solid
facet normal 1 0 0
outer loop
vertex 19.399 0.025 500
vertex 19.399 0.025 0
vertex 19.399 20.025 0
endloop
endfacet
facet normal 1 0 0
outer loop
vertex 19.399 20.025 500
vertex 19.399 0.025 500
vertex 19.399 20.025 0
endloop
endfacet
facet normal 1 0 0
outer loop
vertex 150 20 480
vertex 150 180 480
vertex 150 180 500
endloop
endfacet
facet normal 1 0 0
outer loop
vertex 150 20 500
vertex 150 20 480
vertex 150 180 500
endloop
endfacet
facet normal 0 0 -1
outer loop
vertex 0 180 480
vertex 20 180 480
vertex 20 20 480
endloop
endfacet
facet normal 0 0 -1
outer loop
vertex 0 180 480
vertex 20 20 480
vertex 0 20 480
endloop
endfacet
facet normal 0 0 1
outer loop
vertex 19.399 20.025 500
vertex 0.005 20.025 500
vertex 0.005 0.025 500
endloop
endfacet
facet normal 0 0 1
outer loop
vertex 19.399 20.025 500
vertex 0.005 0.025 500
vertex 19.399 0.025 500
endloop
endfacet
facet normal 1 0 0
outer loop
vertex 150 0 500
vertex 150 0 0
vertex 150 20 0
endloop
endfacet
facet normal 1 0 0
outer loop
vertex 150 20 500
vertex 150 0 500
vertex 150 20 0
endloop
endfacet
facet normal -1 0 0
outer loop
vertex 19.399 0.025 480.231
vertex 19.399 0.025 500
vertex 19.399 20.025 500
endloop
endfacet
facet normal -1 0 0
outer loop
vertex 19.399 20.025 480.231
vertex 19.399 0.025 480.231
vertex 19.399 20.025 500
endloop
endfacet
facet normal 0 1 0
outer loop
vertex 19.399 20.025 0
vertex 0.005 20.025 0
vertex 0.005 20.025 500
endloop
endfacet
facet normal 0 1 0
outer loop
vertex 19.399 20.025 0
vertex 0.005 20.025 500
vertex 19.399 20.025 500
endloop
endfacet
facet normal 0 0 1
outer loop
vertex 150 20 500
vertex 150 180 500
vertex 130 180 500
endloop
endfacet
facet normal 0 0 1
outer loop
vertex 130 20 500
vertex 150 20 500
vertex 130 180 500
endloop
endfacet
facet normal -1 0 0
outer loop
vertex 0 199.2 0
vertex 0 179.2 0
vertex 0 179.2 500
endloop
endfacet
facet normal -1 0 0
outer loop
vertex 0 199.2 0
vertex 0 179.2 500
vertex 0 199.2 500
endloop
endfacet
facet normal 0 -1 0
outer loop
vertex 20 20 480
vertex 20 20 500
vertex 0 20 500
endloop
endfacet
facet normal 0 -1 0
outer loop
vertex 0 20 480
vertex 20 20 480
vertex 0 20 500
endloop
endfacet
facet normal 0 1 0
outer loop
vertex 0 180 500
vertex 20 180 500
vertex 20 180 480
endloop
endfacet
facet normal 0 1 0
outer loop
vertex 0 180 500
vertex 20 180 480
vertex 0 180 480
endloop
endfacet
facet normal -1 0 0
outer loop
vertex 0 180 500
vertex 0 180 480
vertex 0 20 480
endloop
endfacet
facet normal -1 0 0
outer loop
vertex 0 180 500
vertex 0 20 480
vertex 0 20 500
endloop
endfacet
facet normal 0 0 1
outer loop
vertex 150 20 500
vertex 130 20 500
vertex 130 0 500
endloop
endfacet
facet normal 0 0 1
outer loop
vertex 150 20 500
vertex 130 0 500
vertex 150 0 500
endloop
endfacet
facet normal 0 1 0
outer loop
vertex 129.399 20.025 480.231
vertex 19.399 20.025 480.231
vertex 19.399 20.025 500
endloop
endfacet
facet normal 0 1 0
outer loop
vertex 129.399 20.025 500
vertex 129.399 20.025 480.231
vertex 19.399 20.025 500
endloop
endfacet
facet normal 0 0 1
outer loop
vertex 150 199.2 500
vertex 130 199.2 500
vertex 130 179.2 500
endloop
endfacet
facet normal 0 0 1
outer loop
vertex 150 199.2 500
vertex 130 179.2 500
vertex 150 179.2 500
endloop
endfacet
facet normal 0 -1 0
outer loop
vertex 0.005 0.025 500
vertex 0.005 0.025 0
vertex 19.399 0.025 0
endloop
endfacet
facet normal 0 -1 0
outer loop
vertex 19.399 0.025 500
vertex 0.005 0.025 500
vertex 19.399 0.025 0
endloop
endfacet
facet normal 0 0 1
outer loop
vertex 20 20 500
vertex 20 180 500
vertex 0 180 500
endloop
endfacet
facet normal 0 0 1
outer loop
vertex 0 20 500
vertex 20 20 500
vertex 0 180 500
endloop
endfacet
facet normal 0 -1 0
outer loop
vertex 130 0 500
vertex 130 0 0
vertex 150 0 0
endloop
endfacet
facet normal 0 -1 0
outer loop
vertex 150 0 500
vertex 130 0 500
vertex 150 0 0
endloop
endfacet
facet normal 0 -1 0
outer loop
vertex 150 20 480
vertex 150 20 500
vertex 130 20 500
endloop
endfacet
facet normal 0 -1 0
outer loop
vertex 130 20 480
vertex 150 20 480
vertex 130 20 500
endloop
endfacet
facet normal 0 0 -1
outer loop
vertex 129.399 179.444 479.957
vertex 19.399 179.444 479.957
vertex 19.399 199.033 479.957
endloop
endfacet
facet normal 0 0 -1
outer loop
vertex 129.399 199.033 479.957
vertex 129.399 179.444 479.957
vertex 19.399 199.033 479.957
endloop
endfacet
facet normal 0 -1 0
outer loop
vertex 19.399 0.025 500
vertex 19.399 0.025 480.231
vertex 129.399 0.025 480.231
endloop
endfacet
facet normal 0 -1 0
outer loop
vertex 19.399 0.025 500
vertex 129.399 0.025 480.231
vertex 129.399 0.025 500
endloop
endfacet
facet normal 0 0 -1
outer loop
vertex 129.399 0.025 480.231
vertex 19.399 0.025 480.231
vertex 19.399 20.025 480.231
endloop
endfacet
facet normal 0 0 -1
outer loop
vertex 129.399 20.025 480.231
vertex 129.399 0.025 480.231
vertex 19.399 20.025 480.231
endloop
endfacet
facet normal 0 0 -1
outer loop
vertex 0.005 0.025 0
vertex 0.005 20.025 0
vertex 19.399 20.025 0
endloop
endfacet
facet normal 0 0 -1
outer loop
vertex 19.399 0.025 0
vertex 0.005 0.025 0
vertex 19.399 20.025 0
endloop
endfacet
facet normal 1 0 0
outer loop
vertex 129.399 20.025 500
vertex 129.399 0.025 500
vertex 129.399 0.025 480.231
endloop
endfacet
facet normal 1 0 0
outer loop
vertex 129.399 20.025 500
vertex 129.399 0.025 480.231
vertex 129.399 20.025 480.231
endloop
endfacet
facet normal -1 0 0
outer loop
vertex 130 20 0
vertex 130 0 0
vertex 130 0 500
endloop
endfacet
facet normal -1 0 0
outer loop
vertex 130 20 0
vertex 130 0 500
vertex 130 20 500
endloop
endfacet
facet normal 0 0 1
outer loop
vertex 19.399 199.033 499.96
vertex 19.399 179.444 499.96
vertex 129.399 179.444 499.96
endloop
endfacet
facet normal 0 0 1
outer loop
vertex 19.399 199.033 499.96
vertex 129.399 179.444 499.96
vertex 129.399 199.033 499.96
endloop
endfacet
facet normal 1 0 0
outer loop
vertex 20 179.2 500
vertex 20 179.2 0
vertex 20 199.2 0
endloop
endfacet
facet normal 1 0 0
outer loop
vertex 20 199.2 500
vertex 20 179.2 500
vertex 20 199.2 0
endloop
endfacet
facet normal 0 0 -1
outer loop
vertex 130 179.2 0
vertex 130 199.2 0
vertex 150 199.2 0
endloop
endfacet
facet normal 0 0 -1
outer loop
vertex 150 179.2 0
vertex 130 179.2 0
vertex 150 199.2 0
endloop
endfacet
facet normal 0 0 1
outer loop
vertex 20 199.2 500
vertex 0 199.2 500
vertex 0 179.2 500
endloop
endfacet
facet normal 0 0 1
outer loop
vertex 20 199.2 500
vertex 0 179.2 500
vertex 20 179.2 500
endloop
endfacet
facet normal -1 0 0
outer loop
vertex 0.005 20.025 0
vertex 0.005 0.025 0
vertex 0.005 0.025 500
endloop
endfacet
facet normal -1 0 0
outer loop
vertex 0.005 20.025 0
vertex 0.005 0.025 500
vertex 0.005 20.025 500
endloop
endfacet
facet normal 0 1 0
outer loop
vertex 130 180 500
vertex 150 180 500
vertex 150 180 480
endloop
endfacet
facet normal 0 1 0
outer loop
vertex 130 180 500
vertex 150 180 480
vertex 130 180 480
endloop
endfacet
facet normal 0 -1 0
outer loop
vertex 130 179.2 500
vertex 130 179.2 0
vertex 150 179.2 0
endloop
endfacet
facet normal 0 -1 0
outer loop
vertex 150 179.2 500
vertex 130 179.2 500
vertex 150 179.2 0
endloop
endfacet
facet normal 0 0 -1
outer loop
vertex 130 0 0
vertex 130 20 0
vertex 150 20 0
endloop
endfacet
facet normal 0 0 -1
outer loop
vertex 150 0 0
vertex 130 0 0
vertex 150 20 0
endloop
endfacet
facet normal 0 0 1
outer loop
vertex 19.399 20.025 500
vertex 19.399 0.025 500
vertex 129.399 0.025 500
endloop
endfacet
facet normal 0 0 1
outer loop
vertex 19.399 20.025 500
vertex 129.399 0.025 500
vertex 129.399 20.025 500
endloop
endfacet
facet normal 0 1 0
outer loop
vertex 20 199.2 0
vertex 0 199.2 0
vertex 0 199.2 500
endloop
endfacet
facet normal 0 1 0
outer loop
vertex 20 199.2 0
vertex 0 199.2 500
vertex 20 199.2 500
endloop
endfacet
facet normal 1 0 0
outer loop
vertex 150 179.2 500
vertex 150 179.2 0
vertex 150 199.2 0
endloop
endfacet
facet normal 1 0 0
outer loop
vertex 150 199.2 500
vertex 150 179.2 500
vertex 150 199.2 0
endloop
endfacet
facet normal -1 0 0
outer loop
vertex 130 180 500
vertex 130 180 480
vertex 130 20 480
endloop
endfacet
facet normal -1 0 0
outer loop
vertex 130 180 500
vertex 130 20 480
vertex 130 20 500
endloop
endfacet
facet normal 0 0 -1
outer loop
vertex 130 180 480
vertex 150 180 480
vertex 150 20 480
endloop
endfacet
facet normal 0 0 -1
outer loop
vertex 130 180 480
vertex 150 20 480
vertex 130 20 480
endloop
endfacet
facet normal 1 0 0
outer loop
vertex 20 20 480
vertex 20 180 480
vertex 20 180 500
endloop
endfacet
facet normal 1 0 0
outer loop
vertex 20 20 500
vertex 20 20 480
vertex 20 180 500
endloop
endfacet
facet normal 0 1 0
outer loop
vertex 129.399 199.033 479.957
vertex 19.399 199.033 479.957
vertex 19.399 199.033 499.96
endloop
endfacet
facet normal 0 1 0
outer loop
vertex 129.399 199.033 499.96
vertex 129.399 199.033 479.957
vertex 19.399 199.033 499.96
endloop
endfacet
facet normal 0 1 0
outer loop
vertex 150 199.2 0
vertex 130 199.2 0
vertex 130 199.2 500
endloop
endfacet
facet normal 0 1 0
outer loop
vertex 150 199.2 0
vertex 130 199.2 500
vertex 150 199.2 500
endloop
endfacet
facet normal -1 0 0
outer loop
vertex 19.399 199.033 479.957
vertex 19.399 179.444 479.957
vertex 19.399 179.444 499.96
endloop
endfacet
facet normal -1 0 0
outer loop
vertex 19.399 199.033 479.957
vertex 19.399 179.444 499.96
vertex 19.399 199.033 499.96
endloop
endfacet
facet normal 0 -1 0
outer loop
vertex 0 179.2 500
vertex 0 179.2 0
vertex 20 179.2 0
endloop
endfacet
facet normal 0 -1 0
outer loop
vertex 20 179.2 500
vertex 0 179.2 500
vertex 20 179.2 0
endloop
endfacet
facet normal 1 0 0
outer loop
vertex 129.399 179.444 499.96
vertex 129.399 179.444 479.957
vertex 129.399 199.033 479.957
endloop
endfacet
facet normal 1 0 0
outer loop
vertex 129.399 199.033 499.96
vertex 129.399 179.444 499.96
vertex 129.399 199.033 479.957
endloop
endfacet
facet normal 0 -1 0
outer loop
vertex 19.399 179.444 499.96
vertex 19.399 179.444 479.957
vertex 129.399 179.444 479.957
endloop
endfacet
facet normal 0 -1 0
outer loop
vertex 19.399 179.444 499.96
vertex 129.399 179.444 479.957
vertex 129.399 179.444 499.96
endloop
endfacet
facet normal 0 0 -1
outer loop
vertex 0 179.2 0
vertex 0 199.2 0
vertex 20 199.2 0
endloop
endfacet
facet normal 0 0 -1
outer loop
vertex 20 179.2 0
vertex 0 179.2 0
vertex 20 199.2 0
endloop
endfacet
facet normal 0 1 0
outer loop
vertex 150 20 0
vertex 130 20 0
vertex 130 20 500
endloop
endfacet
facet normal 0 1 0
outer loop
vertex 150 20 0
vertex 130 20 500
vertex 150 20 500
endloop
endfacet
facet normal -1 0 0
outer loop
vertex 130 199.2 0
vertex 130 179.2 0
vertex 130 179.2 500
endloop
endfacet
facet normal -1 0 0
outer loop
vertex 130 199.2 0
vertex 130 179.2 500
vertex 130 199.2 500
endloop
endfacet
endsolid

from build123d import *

# Parameters (mm, degrees)
F1_W     = 20
F1_H     = 20
F1_W_2   = 19.393947
F2_DEPTH = 500
F3_W     = 20
F3_H     = 20
F4_DEPTH = 160
F5_W     = 20
F5_H     = 19.769341
F5_W_2   = 19.589409
F5_H_2   = 20.003289
F6_DEPTH = 110


with BuildPart() as f2:
    # F1 (on Top) → F2 (new body)
    with BuildSketch(Plane.XY):
        with Locations((10, 189.199662)):
            Rectangle(F1_W, F1_H)
        with Locations((140, 189.199662)):
            Rectangle(F1_W, F1_H)
        with Locations((140, 10)):
            Rectangle(F1_W, F1_H)
        with Locations((9.702087, 10.024875)):
            Rectangle(F1_W_2, F1_H)
    extrude(amount=F2_DEPTH)


with BuildPart() as f4:
    # F3 (on face) → F4 (new body)
    with BuildSketch(Plane(origin=(0, 20, 0), x_dir=(-1, 0, 0), z_dir=(0, 1, 0))):
        with Locations((-140, 490)):
            Rectangle(F3_W, F3_H)
        with Locations((-10, 490)):
            Rectangle(F3_W, F3_H)
    extrude(amount=F4_DEPTH)


with BuildPart() as f6:
    # F5 (on face) → F6 (new body)
    with BuildSketch(Plane.YZ.offset(19.39906)):
        with Locations((10.024875, 490.11533)):
            Rectangle(F5_W, F5_H)
        with Locations((189.238704, 489.95842)):
            Rectangle(F5_W_2, F5_H_2)
    extrude(amount=F6_DEPTH)


solid = Compound([f2.part, f4.part, f6.part])
